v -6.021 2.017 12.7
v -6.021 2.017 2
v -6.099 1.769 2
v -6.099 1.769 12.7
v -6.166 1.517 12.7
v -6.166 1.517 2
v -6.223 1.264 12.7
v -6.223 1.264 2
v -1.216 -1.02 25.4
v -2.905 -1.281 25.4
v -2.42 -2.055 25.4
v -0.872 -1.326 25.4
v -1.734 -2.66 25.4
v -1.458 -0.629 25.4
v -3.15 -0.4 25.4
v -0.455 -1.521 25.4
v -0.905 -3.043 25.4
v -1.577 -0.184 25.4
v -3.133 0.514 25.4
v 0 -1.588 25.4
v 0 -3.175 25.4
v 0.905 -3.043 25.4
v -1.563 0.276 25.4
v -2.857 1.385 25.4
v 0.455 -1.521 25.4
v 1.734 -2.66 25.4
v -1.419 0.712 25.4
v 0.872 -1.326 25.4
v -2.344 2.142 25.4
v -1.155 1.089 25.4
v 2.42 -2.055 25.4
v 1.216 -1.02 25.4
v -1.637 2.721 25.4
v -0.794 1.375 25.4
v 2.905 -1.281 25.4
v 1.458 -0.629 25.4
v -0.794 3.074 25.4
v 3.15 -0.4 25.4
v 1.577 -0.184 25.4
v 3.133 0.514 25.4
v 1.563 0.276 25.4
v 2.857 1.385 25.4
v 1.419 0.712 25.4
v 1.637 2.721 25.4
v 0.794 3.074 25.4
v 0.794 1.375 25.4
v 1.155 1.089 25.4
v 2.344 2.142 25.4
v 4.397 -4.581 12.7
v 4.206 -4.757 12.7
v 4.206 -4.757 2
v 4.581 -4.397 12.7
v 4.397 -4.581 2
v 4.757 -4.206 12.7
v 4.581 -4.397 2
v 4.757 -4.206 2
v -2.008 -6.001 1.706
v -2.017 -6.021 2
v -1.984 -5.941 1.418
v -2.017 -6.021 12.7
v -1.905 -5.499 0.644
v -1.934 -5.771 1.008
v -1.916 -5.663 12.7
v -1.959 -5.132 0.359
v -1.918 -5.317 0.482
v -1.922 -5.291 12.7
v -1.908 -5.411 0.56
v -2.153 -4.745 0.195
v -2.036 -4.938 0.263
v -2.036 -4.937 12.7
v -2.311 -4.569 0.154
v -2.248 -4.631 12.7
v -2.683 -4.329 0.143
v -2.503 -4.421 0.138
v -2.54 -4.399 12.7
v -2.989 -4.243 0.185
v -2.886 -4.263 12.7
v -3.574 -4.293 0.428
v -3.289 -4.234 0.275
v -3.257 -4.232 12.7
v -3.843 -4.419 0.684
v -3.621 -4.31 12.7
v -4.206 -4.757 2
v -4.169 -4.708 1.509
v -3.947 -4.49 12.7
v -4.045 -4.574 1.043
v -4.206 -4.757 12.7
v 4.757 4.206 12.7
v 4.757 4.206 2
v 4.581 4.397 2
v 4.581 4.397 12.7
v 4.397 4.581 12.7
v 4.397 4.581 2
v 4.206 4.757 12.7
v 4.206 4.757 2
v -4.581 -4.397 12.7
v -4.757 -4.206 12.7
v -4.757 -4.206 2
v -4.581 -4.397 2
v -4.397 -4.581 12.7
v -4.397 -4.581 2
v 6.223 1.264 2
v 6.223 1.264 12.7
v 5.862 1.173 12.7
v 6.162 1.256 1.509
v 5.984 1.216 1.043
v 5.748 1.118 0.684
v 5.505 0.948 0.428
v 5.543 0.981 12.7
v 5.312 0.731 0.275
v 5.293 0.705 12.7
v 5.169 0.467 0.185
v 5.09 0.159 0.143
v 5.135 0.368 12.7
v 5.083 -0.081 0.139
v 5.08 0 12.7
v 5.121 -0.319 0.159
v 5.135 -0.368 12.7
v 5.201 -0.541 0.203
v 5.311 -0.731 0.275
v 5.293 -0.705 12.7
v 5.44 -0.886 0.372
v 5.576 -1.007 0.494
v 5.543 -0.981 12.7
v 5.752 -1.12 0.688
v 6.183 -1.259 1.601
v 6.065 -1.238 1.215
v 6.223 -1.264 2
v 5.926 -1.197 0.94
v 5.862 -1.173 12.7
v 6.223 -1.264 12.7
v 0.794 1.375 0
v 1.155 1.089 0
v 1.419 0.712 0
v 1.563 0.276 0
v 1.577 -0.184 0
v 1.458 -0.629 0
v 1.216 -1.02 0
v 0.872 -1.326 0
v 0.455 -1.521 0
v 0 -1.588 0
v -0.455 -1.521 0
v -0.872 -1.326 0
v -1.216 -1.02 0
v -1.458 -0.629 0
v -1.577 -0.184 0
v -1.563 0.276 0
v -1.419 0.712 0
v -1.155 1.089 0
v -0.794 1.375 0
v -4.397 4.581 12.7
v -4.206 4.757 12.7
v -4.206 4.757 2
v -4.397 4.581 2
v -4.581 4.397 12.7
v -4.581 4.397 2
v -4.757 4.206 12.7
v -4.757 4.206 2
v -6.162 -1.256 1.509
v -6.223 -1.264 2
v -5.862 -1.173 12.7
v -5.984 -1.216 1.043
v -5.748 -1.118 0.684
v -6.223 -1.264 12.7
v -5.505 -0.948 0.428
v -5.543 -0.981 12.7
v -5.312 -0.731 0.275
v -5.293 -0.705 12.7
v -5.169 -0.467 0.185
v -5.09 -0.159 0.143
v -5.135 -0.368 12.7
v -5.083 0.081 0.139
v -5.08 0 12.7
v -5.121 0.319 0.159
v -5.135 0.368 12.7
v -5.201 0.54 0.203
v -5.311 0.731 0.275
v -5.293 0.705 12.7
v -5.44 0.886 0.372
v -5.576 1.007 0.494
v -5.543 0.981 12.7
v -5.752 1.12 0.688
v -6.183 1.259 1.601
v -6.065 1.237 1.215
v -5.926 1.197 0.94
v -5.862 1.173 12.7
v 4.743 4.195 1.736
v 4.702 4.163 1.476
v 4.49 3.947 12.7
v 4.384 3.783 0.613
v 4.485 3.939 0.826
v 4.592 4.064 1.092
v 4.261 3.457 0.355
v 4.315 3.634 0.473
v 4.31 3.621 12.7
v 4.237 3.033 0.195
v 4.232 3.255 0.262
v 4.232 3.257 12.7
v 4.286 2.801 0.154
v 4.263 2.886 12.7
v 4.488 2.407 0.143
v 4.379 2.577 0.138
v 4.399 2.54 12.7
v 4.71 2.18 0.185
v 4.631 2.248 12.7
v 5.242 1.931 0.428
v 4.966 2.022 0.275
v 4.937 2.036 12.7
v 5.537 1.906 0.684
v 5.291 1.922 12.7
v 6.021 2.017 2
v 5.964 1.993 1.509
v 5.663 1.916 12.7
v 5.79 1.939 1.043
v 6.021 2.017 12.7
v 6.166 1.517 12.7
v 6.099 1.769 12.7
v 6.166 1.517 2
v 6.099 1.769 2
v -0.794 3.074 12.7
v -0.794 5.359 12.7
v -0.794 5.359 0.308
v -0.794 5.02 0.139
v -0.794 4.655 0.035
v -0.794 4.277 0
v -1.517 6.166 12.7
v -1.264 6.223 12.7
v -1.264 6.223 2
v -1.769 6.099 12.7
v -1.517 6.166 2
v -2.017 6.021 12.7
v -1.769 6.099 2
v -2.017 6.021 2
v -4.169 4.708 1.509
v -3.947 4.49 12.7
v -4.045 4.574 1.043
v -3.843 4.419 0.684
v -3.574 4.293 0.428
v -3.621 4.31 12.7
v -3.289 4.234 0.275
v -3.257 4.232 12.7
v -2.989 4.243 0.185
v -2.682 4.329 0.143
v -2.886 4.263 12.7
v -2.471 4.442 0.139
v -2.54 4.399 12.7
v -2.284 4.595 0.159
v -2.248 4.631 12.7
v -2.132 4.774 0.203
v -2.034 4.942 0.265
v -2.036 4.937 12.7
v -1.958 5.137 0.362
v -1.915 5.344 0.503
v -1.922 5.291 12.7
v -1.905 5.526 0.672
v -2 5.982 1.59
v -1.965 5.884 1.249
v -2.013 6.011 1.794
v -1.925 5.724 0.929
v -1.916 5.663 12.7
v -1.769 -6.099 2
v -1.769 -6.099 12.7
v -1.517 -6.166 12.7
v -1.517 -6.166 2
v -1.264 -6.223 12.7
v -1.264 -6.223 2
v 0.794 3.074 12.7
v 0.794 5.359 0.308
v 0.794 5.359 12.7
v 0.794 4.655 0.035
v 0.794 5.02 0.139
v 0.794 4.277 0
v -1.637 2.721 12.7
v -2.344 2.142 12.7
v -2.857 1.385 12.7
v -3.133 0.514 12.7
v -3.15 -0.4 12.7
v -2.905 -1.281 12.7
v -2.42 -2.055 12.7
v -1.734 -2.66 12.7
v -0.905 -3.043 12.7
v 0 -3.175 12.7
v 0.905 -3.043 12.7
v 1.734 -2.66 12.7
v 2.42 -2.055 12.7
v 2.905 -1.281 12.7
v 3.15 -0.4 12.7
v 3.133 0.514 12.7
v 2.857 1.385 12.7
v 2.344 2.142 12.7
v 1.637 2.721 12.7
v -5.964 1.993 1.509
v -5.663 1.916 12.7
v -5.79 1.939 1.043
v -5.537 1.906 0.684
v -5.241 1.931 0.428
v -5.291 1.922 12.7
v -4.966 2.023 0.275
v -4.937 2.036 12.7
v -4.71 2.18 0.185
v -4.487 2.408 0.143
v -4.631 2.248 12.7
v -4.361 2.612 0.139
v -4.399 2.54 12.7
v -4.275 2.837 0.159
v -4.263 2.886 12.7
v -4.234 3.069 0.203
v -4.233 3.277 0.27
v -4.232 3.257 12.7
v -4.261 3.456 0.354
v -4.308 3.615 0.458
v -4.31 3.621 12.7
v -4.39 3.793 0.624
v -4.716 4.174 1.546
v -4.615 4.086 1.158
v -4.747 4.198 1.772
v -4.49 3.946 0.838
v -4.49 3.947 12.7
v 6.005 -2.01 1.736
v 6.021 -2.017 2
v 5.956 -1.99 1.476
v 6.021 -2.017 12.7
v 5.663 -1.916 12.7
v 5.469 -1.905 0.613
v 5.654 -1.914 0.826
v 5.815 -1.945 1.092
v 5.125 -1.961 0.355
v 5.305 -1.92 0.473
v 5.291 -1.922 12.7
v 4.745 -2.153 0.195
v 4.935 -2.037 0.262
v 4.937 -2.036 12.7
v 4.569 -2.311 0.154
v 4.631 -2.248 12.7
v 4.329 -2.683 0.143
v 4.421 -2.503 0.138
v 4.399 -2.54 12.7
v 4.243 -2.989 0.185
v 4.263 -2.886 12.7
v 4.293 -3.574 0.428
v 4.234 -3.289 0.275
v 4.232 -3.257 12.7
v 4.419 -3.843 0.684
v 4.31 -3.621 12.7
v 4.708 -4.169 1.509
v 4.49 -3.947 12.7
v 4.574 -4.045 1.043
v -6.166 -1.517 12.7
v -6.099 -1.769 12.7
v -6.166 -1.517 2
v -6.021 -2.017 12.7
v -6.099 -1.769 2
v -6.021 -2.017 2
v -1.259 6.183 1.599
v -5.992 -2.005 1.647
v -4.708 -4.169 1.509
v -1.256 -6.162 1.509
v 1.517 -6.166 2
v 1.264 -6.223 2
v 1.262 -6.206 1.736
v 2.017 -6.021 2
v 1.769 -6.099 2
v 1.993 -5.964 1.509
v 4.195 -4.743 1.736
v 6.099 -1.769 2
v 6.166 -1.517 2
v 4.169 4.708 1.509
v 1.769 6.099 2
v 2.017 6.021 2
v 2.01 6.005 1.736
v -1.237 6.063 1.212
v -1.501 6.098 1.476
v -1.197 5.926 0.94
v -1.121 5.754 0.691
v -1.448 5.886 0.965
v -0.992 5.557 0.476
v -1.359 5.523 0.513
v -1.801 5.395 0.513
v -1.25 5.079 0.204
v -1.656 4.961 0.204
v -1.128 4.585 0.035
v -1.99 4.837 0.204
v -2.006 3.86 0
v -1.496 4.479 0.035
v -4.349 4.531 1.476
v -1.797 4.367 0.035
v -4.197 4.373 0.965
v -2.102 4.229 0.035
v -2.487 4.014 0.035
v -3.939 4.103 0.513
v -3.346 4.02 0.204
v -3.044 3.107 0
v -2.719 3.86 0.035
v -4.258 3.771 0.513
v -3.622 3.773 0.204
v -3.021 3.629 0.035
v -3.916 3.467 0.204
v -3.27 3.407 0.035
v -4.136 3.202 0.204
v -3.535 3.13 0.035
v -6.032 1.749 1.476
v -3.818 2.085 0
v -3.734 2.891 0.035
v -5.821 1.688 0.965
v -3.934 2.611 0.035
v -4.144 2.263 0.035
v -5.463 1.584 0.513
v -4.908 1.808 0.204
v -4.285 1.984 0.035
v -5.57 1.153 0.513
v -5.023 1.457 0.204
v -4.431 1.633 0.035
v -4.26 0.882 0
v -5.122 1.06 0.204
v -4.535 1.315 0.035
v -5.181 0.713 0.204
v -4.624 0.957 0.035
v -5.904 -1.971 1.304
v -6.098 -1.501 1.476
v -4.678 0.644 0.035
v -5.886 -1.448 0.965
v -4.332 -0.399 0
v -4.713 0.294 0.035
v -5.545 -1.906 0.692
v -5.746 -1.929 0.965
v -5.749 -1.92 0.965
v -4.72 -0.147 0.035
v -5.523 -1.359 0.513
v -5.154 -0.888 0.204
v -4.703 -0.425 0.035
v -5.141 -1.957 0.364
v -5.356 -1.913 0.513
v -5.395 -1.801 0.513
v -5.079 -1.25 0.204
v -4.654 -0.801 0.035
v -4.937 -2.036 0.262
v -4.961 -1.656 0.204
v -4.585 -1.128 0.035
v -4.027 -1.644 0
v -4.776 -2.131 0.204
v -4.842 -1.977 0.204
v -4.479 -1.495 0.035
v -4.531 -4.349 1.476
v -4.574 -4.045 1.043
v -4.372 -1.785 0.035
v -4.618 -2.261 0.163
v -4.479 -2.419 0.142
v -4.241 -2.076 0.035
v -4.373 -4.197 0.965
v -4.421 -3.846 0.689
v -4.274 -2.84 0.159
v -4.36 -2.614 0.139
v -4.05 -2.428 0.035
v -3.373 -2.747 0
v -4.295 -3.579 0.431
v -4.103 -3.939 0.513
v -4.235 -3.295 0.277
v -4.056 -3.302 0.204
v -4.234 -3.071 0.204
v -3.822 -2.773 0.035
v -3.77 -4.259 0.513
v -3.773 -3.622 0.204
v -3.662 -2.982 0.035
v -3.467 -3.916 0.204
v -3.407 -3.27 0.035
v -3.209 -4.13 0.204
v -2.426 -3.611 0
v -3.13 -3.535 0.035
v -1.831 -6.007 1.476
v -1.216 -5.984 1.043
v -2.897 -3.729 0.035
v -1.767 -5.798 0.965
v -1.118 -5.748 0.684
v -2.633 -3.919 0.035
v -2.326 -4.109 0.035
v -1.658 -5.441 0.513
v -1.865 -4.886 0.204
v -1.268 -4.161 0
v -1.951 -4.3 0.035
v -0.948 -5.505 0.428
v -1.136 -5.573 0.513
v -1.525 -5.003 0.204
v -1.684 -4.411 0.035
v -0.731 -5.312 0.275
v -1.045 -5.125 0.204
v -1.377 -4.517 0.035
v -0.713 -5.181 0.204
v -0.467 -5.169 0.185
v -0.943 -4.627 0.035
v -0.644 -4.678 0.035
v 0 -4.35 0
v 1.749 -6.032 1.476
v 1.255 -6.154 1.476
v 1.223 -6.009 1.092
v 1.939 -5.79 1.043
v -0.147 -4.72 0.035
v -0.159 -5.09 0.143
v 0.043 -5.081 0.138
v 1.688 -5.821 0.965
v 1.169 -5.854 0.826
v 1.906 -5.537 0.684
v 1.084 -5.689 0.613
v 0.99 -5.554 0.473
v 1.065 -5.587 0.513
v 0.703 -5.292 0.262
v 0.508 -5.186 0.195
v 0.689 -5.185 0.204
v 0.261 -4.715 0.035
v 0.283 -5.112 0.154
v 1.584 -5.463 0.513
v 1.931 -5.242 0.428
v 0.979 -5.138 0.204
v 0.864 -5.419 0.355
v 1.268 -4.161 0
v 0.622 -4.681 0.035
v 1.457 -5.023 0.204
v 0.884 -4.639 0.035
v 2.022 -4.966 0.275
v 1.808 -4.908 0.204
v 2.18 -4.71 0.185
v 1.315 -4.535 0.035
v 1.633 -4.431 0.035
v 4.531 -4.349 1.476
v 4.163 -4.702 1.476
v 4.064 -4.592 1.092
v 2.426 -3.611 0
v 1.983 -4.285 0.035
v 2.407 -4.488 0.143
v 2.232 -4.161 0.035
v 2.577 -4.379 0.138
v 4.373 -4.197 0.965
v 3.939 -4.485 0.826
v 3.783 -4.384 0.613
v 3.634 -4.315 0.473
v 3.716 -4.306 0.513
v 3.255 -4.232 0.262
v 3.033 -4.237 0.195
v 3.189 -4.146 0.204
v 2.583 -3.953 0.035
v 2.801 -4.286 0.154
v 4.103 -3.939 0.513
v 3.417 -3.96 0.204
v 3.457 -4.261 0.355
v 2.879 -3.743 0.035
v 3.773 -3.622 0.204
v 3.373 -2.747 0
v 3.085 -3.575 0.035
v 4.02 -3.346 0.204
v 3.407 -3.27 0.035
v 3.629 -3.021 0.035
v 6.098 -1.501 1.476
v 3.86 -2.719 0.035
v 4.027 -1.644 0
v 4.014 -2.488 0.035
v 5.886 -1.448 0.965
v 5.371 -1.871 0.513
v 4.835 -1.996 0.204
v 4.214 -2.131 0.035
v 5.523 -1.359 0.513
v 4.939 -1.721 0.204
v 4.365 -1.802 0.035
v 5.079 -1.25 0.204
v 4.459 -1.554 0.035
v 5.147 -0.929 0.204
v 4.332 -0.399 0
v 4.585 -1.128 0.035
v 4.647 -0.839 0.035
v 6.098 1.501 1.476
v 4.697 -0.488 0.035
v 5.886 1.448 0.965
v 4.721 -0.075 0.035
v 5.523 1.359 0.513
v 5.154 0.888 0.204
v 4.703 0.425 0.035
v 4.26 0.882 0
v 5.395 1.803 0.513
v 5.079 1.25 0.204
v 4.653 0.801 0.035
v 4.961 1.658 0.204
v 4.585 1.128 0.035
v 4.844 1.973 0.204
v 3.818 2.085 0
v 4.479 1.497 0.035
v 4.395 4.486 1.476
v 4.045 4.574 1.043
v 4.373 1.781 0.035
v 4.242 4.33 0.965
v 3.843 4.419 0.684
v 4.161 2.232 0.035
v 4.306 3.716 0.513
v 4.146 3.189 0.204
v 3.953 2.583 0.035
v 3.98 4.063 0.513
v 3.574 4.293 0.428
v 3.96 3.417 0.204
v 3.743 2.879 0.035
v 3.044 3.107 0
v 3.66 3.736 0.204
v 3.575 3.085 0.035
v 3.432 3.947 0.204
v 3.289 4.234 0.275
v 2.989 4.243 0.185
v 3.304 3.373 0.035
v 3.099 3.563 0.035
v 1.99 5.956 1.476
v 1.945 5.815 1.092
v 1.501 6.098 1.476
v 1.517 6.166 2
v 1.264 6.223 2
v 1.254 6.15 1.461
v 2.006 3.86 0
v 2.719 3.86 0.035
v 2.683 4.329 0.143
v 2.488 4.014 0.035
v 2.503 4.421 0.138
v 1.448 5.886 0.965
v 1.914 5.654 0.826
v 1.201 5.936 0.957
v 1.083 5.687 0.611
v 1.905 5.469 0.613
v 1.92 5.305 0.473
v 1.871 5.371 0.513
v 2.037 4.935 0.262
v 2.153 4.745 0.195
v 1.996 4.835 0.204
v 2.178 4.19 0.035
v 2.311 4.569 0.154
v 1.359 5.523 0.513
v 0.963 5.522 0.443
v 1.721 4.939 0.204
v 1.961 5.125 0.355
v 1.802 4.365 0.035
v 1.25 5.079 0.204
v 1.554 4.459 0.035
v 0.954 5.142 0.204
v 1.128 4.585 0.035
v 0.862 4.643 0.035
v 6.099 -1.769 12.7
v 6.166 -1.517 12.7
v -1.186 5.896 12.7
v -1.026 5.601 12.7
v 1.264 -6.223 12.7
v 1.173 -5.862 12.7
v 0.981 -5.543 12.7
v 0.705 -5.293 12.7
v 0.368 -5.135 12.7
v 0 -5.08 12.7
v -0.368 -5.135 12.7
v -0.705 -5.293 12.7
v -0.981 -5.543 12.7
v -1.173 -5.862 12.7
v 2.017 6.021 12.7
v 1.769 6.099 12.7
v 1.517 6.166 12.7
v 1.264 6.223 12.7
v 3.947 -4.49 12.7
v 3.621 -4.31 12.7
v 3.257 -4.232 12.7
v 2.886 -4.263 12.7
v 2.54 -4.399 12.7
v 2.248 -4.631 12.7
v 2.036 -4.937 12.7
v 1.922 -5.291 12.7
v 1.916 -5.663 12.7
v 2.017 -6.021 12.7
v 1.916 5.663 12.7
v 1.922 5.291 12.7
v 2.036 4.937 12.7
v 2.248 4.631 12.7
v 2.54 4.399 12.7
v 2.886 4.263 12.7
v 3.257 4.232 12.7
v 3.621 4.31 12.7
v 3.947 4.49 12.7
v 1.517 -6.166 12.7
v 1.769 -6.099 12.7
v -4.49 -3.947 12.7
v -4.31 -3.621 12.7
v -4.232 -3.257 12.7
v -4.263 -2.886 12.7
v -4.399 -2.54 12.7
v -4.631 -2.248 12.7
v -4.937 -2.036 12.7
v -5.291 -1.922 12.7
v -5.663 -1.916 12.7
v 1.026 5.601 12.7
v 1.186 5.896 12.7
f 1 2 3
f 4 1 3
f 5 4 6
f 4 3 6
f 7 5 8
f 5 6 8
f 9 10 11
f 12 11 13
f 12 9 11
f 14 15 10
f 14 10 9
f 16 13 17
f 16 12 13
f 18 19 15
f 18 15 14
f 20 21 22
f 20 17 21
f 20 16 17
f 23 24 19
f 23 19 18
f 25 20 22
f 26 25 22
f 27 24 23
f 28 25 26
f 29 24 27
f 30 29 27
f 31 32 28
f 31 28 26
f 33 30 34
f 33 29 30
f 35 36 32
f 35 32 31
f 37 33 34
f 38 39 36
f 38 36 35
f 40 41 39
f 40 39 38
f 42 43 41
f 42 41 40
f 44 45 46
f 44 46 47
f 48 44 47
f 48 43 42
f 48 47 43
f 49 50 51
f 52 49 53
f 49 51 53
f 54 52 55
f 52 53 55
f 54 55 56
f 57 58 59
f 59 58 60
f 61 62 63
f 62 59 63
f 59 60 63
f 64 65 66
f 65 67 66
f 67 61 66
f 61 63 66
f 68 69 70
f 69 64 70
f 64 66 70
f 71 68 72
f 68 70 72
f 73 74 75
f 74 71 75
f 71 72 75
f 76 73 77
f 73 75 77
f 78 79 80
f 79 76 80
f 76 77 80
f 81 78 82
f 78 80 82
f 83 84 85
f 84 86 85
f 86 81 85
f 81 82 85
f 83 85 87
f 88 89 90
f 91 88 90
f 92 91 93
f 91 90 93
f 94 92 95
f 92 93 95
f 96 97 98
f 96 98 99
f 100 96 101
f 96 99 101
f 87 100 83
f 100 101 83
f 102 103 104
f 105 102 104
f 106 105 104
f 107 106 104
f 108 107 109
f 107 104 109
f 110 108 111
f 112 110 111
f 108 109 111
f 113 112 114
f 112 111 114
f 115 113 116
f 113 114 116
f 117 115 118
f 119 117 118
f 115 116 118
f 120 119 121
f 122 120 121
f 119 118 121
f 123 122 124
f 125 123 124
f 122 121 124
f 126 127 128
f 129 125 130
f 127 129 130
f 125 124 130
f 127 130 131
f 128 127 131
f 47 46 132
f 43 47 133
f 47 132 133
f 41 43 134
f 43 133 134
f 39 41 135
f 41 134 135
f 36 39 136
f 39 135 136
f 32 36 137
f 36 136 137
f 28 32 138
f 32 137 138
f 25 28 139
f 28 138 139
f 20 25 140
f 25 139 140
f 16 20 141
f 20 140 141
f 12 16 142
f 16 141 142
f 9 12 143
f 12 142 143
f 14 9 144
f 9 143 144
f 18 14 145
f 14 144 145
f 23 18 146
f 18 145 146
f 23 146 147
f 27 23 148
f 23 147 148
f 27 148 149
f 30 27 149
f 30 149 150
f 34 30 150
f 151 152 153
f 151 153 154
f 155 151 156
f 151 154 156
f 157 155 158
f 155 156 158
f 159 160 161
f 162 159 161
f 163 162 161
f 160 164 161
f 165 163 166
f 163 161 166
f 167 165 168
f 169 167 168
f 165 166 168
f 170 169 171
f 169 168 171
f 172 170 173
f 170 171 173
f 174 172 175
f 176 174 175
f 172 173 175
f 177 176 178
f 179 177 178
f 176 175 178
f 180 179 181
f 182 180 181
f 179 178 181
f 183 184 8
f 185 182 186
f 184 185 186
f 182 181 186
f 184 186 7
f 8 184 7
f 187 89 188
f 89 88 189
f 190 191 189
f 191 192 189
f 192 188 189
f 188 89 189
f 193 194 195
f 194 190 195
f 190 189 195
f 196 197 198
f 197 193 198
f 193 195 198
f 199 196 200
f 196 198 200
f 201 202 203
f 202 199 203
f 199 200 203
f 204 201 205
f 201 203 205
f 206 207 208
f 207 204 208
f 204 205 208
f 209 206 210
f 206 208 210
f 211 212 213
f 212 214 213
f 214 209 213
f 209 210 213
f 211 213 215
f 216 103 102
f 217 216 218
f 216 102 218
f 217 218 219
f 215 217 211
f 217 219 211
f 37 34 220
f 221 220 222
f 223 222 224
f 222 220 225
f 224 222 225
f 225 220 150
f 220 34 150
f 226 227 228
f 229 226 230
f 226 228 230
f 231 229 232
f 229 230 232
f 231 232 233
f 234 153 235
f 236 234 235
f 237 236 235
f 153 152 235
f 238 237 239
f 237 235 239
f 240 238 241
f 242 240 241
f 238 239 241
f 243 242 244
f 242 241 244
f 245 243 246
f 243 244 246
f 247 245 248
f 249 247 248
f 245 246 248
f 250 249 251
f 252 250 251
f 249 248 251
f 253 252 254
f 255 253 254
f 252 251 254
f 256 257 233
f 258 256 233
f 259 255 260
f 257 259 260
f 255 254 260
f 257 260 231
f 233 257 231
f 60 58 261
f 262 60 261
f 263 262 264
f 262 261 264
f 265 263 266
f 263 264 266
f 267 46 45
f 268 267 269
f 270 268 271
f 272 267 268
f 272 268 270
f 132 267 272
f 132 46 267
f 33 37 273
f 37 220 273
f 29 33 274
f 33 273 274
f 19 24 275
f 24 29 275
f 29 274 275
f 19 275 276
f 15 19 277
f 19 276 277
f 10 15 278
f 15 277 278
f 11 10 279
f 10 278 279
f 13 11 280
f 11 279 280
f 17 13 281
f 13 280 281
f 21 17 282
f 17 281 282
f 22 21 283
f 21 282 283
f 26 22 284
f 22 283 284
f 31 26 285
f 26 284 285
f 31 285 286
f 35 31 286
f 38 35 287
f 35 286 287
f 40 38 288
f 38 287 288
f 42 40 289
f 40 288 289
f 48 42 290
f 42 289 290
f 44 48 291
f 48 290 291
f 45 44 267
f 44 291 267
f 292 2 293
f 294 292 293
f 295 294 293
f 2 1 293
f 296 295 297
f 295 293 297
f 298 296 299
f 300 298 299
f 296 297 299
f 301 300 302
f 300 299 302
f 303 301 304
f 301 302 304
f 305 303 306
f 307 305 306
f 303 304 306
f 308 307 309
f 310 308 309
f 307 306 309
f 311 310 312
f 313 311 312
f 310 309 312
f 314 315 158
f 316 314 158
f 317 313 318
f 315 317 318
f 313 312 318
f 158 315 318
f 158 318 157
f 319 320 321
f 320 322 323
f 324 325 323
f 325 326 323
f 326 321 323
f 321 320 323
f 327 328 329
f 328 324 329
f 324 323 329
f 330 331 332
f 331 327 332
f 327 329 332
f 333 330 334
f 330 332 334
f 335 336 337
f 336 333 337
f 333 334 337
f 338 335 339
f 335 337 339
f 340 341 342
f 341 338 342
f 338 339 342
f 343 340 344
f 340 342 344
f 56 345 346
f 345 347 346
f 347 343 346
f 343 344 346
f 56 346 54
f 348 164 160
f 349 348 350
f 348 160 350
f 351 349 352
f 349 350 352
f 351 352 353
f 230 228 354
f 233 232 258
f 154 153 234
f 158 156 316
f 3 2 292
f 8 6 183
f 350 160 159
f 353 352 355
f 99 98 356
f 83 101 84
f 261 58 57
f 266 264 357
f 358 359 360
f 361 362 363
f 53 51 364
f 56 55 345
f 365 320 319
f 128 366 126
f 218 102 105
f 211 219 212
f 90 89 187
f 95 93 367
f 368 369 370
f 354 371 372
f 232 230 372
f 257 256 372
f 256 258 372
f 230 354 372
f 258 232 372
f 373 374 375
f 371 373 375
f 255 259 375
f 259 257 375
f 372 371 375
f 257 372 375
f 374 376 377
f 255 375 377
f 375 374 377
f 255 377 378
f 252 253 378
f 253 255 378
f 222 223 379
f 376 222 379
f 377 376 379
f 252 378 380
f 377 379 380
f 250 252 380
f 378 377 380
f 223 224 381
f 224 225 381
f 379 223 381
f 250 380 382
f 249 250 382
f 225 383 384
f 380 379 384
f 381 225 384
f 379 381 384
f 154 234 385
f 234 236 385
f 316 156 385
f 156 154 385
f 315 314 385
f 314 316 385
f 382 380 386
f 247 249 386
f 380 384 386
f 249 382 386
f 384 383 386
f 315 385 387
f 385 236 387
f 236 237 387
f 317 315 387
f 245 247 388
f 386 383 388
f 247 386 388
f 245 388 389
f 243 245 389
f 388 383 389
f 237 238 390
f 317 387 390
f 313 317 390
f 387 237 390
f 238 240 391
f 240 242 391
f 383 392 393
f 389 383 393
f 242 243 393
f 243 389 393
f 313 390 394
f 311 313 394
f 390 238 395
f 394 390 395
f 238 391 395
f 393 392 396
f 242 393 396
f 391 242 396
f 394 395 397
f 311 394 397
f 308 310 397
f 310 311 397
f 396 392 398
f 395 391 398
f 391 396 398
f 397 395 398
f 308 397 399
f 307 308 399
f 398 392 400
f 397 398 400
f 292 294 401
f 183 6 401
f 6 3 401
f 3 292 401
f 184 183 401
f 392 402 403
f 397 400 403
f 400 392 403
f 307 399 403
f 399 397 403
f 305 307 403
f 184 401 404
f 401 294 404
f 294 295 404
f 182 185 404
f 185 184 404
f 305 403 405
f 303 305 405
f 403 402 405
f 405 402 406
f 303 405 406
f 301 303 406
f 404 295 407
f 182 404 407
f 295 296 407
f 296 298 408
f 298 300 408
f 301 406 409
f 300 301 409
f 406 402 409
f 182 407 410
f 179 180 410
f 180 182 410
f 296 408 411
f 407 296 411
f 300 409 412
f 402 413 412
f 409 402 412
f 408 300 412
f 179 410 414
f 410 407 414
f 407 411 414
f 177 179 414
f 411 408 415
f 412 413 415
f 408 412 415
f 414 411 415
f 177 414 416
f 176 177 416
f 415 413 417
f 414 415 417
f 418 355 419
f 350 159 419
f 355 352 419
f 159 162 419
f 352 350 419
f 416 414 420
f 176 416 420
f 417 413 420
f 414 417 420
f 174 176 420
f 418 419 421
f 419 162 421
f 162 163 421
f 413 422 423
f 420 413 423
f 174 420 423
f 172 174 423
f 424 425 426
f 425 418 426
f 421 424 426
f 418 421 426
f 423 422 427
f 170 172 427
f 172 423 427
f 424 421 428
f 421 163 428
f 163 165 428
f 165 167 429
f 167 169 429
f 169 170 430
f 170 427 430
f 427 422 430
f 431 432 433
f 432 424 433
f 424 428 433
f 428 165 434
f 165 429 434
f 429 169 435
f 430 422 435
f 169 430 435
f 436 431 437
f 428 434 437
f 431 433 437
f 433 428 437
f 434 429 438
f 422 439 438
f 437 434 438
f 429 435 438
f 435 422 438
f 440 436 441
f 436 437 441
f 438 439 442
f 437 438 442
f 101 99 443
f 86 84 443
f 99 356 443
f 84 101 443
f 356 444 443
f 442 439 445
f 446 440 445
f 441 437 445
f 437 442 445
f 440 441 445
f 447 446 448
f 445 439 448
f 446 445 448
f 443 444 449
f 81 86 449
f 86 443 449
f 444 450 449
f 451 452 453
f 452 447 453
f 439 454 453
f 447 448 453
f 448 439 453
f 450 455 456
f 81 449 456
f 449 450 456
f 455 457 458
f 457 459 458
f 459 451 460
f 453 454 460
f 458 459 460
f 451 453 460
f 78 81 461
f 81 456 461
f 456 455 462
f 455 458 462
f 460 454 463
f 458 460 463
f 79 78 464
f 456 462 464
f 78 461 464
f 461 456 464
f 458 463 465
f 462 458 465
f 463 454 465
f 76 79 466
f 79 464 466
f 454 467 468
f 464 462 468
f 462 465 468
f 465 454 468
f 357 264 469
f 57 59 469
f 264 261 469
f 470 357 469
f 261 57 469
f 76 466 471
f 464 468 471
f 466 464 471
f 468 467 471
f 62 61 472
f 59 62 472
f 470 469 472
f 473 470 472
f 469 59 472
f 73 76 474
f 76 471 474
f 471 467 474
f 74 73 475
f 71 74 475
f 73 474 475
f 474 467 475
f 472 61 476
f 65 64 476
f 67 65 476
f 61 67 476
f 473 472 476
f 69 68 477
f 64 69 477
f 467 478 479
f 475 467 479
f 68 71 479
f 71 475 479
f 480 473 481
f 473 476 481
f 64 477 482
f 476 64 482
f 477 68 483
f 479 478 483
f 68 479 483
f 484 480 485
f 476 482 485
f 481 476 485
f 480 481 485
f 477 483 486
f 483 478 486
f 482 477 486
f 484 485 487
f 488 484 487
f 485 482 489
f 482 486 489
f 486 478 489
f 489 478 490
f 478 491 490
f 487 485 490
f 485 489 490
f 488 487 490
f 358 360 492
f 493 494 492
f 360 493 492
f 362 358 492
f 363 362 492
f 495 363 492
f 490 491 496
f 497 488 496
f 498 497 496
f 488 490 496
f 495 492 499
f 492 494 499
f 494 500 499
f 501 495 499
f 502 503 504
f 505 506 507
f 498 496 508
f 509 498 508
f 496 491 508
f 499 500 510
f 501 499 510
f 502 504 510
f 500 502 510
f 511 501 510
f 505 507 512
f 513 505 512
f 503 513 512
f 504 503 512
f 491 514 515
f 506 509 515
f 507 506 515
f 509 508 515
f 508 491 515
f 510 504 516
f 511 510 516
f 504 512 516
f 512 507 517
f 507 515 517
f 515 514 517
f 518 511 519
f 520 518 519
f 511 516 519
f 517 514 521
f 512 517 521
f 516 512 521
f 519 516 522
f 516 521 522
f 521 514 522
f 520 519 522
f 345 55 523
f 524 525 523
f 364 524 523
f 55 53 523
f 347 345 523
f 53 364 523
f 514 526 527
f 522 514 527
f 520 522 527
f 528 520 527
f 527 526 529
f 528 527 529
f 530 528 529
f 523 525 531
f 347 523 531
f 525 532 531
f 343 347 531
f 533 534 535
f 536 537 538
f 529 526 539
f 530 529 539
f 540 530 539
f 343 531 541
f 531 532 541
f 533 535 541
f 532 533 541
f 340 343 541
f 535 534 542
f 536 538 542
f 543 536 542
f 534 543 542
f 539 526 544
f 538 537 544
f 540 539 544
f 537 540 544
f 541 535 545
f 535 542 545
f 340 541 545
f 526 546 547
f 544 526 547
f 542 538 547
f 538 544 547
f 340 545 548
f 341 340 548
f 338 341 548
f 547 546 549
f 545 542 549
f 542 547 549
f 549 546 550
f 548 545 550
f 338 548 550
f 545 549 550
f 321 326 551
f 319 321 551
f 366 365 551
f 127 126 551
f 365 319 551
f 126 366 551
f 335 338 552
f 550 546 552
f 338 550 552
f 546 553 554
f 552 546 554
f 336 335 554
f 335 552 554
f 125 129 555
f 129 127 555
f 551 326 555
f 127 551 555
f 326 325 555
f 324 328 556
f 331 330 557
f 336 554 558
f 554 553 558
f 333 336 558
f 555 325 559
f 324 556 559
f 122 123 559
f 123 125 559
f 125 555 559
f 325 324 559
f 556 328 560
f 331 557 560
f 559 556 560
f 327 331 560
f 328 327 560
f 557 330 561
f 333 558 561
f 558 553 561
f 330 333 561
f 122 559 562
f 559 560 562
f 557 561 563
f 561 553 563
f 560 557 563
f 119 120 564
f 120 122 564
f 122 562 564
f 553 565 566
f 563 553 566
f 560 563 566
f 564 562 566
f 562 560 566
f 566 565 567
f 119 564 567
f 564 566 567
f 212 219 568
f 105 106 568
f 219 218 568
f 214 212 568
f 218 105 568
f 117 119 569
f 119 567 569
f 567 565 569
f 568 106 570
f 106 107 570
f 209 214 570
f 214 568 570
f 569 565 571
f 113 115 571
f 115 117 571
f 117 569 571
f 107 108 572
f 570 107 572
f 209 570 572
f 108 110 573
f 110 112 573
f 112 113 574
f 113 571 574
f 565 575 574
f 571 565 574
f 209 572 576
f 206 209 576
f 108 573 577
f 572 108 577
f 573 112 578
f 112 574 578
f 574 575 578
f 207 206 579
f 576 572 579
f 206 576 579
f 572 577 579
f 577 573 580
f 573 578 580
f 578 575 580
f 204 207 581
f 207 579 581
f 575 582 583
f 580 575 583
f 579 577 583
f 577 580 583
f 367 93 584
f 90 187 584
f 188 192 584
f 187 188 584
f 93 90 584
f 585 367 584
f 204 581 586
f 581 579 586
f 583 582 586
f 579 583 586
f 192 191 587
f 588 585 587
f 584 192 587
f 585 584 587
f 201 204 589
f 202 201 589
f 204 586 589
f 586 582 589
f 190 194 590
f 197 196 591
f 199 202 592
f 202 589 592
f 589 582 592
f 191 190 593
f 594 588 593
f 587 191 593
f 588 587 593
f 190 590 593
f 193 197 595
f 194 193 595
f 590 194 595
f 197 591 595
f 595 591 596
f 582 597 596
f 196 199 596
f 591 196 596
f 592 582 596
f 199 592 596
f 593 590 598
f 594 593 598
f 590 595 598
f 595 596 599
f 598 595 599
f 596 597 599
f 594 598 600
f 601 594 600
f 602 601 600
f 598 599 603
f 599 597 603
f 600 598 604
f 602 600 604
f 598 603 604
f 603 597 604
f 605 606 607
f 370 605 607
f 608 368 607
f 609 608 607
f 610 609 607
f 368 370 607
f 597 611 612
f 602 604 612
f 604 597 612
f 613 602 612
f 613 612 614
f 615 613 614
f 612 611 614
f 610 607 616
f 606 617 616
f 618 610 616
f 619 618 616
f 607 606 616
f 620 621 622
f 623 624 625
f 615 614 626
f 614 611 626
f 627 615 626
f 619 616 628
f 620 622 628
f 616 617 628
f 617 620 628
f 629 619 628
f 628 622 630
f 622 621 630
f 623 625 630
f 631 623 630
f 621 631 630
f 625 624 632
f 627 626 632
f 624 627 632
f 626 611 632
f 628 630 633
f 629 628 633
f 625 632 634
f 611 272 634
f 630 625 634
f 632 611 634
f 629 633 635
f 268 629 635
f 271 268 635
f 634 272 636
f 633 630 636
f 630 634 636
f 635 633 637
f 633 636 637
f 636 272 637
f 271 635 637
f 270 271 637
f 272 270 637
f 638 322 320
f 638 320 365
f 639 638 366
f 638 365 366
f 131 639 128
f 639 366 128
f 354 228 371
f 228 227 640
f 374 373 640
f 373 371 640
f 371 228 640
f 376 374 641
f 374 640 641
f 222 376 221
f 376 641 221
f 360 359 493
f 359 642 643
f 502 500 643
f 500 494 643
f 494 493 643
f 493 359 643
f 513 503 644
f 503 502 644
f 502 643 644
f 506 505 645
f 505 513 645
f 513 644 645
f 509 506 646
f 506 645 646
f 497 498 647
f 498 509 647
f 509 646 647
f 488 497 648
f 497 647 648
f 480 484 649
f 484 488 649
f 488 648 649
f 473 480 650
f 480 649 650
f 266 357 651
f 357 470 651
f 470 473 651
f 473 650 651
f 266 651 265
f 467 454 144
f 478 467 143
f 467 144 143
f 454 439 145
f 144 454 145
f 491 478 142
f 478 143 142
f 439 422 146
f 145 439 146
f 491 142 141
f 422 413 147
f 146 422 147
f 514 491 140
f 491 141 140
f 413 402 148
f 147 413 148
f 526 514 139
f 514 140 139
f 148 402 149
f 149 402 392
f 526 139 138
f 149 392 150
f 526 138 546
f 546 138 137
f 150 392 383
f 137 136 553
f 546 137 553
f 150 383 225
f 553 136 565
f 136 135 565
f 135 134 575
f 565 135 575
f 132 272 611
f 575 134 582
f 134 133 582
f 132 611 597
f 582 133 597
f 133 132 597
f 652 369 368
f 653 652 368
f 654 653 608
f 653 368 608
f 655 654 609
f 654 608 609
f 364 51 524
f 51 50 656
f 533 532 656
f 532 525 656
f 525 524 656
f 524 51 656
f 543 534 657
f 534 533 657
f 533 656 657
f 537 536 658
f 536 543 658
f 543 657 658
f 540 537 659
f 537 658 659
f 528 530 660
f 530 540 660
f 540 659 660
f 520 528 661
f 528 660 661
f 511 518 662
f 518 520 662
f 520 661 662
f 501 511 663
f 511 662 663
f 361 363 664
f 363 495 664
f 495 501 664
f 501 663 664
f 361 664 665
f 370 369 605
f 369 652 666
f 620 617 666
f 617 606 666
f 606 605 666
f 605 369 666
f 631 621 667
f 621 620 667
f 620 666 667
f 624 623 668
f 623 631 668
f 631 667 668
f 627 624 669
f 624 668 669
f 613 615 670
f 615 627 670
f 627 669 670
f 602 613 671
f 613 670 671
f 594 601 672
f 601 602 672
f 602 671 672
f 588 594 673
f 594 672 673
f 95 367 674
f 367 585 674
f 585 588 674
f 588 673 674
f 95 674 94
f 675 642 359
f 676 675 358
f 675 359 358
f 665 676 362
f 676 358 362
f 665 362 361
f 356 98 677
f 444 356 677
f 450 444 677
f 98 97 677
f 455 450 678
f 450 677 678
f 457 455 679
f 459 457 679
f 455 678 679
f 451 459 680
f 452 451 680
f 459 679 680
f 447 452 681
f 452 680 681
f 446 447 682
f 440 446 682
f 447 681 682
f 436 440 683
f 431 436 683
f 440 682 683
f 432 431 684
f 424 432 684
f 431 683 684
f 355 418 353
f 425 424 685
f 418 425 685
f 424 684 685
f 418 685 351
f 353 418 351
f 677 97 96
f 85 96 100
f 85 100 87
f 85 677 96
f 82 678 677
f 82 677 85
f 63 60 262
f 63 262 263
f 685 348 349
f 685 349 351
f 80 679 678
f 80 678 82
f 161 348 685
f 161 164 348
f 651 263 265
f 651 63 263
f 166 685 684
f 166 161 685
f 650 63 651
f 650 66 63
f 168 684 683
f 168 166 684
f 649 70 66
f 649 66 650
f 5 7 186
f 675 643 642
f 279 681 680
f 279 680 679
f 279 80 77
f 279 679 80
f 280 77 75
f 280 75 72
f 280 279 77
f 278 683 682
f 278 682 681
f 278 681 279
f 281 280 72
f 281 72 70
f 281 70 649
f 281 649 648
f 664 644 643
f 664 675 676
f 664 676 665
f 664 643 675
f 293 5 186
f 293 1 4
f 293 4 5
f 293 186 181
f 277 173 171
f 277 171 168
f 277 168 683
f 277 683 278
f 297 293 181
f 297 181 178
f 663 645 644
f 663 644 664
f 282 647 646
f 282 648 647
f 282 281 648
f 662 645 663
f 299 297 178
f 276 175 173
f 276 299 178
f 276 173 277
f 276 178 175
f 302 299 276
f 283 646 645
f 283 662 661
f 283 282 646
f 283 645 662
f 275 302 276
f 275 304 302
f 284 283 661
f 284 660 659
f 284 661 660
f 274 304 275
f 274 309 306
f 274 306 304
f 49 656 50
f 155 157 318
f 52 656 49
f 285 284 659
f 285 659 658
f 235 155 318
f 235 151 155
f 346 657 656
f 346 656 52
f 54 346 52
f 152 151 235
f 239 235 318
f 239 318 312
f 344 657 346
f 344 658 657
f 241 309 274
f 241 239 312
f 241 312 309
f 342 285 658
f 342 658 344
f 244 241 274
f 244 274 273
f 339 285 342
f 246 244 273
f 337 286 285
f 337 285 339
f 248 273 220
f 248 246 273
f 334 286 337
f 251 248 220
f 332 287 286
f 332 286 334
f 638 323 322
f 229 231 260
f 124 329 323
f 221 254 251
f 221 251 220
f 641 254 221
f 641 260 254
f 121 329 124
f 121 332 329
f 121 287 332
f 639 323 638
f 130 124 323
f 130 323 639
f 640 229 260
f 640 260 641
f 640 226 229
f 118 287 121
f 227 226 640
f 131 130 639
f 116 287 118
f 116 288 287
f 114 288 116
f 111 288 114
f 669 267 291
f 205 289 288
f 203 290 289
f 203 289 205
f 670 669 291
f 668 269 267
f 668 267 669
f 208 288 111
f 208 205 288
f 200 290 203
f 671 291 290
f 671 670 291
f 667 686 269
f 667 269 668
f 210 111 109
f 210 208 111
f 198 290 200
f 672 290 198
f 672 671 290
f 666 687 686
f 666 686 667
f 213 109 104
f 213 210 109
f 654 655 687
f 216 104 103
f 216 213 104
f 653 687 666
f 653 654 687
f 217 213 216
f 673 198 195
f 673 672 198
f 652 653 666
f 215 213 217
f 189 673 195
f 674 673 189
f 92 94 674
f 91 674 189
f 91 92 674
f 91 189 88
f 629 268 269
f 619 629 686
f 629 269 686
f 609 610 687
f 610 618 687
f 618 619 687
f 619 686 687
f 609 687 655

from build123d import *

# Parameters (mm, degrees)
CROQUIS1_R              = 6.35
SALIENTE_EXTRUIR1_DEPTH = 12.7
REDONDEO2_R             = 2
CROQUIS2_R              = 1.27
CORTAR_EXTRUIR1_DEPTH   = 12.7
CROQUIS4_R              = 3.175
SALIENTE_EXTRUIR2_DEPTH = 12.7
CROQUIS3_R              = 1.5875
CORTAR_EXTRUIR2_DEPTH   = 27.881433379
CROQUIS5_W              = 1.5875
CROQUIS5_H              = 31.254771719
CORTAR_EXTRUIR3_DEPTH   = 12.7


with BuildPart() as part:
    # Croquis1 → Saliente-Extruir1 (new body)
    with BuildSketch(Plane.XY):
        Circle(CROQUIS1_R)
    extrude(amount=SALIENTE_EXTRUIR1_DEPTH)

    # Redondeo2
    redondeo2_edges = [part.edges().sort_by_distance(p)[0] for p in [
        (-6.35, 0, 0),
    ]]
    fillet(redondeo2_edges, radius=REDONDEO2_R)

    # Croquis2 → Cortar-Extruir1 (cut)
    with BuildSketch(Plane.XY.offset(12.7)):
        with Locations((-6.35, 0)):
            Circle(CROQUIS2_R)
        with Locations((-5.499261314, 3.175)):
            Circle(CROQUIS2_R)
        with Locations((-3.175, 5.499261314)):
            Circle(CROQUIS2_R)
        with Locations((0, 6.35)):
            Circle(CROQUIS2_R)
        with Locations((3.175, 5.499261314)):
            Circle(CROQUIS2_R)
        with Locations((5.499261314, 3.175)):
            Circle(CROQUIS2_R)
        with Locations((6.35, 0)):
            Circle(CROQUIS2_R)
        with Locations((5.499261314, -3.175)):
            Circle(CROQUIS2_R)
        with Locations((3.175, -5.499261314)):
            Circle(CROQUIS2_R)
        with Locations((0, -6.35)):
            Circle(CROQUIS2_R)
        with Locations((-3.175, -5.499261314)):
            Circle(CROQUIS2_R)
        with Locations((-5.499261314, -3.175)):
            Circle(CROQUIS2_R)
    extrude(amount=-CORTAR_EXTRUIR1_DEPTH, mode=Mode.SUBTRACT)

    # Croquis4 → Saliente-Extruir2 (add)
    with BuildSketch(Plane.XY.offset(12.7)):
        Circle(CROQUIS4_R)
    extrude(amount=SALIENTE_EXTRUIR2_DEPTH)

    # Croquis3 → Cortar-Extruir2 (cut, through all)
    with BuildSketch(Plane(origin=(0, 0, 0), x_dir=(-1, 0, 0), z_dir=(0, 0, -1))):
        Circle(CROQUIS3_R)
    extrude(amount=-CORTAR_EXTRUIR2_DEPTH, mode=Mode.SUBTRACT)

    # Croquis5 → Cortar-Extruir3 (cut)
    with BuildSketch(Plane(origin=(0, 0, 0), x_dir=(1, 0, 0), z_dir=(0, 1, 0))):
        with Locations((0, -15.62738586)):
            Rectangle(CROQUIS5_W, CROQUIS5_H)
    extrude(amount=CORTAR_EXTRUIR3_DEPTH, mode=Mode.SUBTRACT)


solid = part.part
